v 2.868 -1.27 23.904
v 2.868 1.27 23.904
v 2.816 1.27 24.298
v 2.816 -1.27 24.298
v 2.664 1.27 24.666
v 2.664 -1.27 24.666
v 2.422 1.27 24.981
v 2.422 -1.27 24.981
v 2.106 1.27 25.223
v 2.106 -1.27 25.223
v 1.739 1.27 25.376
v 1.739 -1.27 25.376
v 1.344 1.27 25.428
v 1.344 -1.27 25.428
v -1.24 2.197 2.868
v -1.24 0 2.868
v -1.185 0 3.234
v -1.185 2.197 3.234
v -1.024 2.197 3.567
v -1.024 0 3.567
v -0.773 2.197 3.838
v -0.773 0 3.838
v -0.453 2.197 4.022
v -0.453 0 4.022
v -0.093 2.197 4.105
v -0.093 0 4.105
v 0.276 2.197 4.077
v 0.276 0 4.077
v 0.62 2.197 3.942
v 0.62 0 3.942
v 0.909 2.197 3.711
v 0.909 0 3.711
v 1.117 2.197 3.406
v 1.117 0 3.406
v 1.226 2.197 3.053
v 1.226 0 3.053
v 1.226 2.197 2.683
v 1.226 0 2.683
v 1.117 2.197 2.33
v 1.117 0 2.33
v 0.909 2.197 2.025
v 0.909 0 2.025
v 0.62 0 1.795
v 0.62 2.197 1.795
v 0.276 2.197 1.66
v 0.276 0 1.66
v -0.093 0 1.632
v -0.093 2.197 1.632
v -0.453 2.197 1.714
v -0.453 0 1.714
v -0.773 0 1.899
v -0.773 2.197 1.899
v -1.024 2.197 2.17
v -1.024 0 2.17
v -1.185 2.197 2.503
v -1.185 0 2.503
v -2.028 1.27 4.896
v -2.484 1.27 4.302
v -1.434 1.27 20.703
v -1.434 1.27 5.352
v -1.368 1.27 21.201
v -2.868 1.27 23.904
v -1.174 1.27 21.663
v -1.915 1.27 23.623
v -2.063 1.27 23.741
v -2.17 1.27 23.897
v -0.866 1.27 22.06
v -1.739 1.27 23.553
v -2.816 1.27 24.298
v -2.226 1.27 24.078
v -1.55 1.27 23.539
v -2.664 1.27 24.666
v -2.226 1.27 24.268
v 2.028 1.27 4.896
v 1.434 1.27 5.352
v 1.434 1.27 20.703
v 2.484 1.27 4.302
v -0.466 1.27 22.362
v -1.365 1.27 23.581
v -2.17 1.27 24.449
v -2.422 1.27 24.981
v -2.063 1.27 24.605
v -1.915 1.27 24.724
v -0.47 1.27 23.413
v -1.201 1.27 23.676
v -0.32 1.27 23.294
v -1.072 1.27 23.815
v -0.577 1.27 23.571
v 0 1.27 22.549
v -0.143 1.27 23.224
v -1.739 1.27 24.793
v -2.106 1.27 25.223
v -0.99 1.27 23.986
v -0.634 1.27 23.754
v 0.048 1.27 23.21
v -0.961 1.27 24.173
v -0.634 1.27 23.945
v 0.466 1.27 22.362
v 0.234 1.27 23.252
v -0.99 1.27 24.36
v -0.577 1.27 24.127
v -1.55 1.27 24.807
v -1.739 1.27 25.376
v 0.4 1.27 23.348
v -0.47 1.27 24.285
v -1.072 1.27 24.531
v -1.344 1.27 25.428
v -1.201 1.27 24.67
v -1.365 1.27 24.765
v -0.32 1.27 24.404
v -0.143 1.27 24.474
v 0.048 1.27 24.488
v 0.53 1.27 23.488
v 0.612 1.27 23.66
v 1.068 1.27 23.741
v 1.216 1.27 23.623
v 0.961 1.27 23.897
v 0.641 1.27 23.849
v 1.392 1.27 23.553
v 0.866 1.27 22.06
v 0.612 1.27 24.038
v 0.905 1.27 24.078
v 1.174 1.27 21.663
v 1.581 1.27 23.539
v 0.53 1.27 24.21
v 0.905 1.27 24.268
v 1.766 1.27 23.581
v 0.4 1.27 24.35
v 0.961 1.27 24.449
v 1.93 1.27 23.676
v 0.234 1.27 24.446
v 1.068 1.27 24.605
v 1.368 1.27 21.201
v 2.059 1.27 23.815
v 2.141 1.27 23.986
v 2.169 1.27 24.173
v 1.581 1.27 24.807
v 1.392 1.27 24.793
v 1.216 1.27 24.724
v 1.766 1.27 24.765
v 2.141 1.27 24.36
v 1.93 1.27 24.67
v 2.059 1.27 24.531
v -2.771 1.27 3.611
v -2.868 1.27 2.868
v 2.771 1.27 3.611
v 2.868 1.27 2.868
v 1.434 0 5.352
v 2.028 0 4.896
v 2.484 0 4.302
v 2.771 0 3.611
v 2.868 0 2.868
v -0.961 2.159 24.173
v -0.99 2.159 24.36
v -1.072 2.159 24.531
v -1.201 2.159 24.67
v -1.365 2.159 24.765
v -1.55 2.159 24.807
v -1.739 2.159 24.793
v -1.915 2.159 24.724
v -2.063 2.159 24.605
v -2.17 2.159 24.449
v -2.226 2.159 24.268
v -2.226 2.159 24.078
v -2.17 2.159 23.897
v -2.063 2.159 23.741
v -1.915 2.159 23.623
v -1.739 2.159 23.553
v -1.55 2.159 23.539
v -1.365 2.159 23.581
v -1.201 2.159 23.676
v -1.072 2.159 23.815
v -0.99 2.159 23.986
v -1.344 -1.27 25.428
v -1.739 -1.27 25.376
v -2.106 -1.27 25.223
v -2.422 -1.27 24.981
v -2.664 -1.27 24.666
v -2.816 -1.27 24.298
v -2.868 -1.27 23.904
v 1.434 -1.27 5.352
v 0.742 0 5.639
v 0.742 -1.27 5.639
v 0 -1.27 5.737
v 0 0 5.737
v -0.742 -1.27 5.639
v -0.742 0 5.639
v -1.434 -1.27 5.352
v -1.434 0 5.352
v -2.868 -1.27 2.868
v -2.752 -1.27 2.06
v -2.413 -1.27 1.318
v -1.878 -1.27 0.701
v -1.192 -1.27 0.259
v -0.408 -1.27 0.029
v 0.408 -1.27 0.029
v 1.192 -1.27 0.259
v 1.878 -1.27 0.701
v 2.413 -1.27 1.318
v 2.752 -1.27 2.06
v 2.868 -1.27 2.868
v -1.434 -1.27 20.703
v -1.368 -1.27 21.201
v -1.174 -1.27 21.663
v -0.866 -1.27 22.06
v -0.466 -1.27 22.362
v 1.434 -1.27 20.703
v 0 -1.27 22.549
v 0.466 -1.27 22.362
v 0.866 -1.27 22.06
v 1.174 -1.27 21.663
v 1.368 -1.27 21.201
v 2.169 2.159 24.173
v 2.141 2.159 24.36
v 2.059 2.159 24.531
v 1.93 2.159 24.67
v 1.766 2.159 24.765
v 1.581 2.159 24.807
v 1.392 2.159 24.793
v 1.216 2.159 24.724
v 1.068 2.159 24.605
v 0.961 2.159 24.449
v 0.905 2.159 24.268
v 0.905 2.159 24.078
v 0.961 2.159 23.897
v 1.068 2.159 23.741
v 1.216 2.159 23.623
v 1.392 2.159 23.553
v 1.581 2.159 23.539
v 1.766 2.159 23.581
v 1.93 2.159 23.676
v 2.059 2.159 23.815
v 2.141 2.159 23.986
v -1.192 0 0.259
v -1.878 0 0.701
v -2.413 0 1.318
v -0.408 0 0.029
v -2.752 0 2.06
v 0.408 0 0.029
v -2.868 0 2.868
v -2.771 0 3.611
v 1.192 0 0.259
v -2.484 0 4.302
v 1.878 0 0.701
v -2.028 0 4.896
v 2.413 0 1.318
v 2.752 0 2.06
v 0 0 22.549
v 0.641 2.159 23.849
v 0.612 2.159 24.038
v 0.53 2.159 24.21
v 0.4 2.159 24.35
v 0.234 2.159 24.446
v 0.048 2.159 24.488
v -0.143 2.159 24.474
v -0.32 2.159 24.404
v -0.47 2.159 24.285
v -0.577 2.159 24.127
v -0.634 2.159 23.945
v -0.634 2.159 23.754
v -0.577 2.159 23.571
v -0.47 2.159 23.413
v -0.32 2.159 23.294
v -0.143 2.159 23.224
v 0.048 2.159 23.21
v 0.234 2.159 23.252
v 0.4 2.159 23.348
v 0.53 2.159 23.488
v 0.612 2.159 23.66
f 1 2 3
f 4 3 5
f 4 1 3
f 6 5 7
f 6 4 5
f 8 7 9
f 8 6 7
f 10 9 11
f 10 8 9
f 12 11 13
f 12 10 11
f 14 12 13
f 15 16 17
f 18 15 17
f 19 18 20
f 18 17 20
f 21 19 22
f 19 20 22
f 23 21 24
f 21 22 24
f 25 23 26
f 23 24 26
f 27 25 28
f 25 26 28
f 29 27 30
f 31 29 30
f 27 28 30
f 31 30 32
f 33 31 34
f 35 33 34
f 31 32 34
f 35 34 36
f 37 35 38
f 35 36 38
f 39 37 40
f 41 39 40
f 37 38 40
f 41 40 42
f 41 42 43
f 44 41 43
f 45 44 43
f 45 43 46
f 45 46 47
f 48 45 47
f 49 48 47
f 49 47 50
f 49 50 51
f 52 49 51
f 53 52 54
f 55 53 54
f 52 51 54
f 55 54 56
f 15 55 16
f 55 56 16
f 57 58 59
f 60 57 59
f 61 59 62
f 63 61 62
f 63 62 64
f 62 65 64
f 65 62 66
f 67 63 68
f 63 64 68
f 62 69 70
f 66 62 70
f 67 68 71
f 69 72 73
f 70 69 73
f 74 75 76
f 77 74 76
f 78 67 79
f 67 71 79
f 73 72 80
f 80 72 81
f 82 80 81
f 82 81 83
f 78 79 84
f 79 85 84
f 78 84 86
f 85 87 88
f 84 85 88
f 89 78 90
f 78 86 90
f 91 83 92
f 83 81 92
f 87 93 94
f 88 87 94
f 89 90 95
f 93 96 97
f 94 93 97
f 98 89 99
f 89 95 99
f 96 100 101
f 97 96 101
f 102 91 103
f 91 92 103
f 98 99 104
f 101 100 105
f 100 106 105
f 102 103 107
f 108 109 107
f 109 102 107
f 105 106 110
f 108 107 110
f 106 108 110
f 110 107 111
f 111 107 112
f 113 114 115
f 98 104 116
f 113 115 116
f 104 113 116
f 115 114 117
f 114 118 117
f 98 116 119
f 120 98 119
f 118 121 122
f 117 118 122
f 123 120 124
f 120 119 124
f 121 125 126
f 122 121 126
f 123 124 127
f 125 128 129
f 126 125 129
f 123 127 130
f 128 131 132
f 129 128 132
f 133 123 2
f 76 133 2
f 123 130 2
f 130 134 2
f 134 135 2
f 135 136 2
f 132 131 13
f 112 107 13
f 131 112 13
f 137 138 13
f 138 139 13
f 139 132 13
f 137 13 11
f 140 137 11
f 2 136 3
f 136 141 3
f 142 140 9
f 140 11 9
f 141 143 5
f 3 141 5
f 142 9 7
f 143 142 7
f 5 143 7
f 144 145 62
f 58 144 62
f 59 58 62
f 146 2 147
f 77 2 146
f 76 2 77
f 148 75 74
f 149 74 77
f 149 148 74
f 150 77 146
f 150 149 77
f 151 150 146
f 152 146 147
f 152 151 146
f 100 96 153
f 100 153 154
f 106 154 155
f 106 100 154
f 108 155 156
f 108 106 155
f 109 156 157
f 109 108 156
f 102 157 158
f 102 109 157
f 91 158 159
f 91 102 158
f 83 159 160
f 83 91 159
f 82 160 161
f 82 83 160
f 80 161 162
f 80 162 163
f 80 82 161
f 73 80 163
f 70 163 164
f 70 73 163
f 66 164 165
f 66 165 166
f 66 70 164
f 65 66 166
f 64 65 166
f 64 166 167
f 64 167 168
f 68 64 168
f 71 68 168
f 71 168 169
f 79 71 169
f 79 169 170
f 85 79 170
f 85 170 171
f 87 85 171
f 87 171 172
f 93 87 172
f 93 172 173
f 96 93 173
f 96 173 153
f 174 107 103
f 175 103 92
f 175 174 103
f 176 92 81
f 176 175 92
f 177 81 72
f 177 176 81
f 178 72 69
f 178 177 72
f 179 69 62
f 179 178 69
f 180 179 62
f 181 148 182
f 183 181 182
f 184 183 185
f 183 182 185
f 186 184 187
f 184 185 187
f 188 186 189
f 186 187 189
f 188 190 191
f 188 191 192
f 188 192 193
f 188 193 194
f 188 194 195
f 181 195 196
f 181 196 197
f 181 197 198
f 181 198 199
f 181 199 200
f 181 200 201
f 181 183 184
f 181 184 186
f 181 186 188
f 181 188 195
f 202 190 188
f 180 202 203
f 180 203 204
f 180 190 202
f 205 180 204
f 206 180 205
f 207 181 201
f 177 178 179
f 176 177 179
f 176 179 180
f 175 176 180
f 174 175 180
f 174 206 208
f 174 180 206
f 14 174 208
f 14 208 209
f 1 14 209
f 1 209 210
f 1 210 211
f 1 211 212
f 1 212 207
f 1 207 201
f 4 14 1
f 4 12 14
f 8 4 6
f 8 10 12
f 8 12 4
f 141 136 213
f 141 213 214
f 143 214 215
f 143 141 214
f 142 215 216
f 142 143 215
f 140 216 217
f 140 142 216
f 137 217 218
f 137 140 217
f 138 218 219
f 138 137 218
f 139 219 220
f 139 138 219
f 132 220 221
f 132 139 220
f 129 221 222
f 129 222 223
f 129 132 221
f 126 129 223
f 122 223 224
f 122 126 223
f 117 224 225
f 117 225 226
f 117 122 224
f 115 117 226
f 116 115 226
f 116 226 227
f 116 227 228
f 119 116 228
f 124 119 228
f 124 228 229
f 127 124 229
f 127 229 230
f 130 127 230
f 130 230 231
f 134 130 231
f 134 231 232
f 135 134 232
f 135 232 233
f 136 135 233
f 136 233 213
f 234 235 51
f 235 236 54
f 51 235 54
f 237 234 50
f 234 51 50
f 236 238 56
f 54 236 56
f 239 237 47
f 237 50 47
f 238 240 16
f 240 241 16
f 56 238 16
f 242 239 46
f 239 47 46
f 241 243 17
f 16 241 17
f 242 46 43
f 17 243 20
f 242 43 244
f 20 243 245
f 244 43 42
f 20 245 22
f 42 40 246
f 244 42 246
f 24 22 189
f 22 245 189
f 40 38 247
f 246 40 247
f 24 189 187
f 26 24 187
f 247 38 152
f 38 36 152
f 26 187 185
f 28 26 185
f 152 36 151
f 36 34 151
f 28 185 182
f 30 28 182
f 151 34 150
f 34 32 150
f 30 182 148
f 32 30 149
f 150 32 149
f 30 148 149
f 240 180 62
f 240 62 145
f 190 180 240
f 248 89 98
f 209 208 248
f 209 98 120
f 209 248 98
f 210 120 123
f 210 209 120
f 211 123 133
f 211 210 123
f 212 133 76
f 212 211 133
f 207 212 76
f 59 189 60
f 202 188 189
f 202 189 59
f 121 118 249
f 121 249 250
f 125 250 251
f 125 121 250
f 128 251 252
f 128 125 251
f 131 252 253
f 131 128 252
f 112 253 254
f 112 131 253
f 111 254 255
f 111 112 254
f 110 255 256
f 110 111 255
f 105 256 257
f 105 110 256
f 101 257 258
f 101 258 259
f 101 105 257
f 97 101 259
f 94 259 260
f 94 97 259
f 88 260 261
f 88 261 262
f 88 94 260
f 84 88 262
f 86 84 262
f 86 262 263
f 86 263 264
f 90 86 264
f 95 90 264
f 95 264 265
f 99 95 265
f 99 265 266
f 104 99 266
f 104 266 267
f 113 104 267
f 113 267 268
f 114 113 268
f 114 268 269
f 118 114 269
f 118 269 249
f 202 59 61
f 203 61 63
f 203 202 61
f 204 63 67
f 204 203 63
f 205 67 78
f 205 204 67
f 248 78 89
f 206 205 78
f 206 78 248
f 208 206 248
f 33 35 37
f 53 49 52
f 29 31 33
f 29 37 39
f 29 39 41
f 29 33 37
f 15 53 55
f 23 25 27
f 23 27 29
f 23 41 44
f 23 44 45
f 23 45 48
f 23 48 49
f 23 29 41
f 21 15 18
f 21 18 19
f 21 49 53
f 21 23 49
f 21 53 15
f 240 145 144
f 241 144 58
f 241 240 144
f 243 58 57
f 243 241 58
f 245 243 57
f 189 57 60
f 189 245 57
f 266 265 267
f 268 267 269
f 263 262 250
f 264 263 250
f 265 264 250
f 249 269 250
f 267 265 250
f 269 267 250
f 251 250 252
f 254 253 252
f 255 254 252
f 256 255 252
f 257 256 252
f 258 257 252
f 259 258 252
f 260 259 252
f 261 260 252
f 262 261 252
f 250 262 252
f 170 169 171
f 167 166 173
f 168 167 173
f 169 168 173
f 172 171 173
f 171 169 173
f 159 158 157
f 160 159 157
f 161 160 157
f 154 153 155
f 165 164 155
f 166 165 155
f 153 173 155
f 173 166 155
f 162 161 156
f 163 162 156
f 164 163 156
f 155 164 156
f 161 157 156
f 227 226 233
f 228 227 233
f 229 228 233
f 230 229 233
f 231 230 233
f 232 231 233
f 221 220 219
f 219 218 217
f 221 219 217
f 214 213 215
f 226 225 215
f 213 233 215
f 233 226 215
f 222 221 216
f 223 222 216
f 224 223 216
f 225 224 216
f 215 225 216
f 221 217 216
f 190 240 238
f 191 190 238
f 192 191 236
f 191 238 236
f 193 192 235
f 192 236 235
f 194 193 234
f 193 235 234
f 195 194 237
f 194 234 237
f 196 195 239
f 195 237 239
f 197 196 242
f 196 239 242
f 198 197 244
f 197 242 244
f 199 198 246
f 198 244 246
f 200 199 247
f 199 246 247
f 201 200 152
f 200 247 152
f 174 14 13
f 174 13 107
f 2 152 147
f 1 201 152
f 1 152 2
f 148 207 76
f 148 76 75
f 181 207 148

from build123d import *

# Parameters (mm, degrees)
F1_DEPTH    = 1.27
F3_R        = 1.524
F5_T1_DEPTH = 1.27
F2_R        = 1.2397519619
F6_DEPTH    = 2.1971
F4_R        = 0.6356353333
F4_R_2      = 0.6409754112
F7_DEPTH    = 3.429
F9_DEPTH    = 2.54


# Not quite as in the source:
# - a fillet or chamfer that OpenCascade refuses, or shapes differently, is made with other operations: its cross-section is extruded or revolved along the edge and cut away or added


with BuildPart() as f1:
    # F0 (on Front) → F1 (new body)
    with BuildSketch(Plane.XZ):
        with BuildLine():
            ThreePointArc((1.4341250062, 5.3522273875), (2.4839773751, 4.3023750186), (2.8682500124, 2.8682500124))
            Line((2.8682500124, 2.8682500124), (2.8682500124, 25.4276227206))
            Line((2.8682500124, 25.4276227206), (0, 25.4276227206))
            Line((0, 25.4276227206), (-1.4341250062, 25.4276227206))
            Line((-1.4341250062, 25.4276227206), (-2.8682500124, 25.4276227206))
            Line((-2.8682500124, 25.4276227206), (-2.8682500124, 2.8682500124))
            ThreePointArc((-2.8682500124, 2.8682500124), (-2.4839773751, 4.3023750186), (-1.4341250062, 5.3522273875))
            Line((-1.4341250062, 5.3522273875), (-1.4341250062, 22.6080268621))
            Line((-1.4341250062, 22.6080268621), (1.4341250062, 22.6080268621))
            Line((1.4341250062, 22.6080268621), (1.4341250062, 5.3522273875))
        make_face()
        with BuildLine():
            ThreePointArc((-2.8682500124, 2.8682500124), (0, 0), (2.8682500124, 2.8682500124))
            ThreePointArc((2.8682500124, 2.8682500124), (2.4839773751, 4.3023750186), (1.4341250062, 5.3522273875))
            ThreePointArc((1.4341250062, 5.3522273875), (0, 5.7365000248), (-1.4341250062, 5.3522273875))
            ThreePointArc((-1.4341250062, 5.3522273875), (-2.4839773751, 4.3023750186), (-2.8682500124, 2.8682500124))
        make_face()
    extrude(amount=F1_DEPTH)

    # F3
    f3_edges = [f1.edges().sort_by_distance(p)[0] for p in [
        (2.86825, -0.635, 25.427623),
        (-2.86825, -0.635, 25.427623),
    ]]
    fillet(f3_edges, radius=F3_R)

    # F5: fillet of radius 1.905 on 2 edges, made by hand

    # F5_s2 → F5_t1 (join)
    with BuildSketch(Plane.XZ):
        with BuildLine():
            ThreePointArc((-0.4708749938, 22.6080268621), (0.8761634244, 22.0500652803), (1.4341250062, 20.7030268621))
            Line((1.4341250062, 20.7030268621), (1.4341250062, 22.6080268621))
            Line((1.4341250062, 22.6080268621), (-0.4708749938, 22.6080268621))
        make_face()
        with BuildLine():
            ThreePointArc((-1.4341250062, 20.7030268621), (-0.8761634244, 22.0500652803), (0.4708749938, 22.6080268621))
            Line((0.4708749938, 22.6080268621), (-1.4341250062, 22.6080268621))
            Line((-1.4341250062, 22.6080268621), (-1.4341250062, 20.7030268621))
        make_face()
    extrude(amount=F5_T1_DEPTH)

    # F2 (on face) → F6 (join)
    with BuildSketch(Plane(origin=(0, 0, 0), x_dir=(-1, 0, 0), z_dir=(0, 1, 0))):
        with Locations((0, 2.8682500124)):
            Circle(F2_R)
    extrude(amount=F6_DEPTH)

    # F4 (on face) → F7 (join)
    with BuildSketch(Plane.XZ.offset(1.27)):
        with Locations((-1.5970880988, 24.1730304042)):
            Circle(F4_R)
        with Locations((1.5335635452, 24.1730304042)):
            Circle(F4_R)
        with Locations((0, 23.8491314396)):
            Circle(F4_R_2)
    extrude(amount=-F7_DEPTH)

    # F8 (on face) → F9 (join)
    with BuildSketch(Plane.XZ.offset(1.27)):
        with BuildLine():
            ThreePointArc((1.4341250062, 5.3522273875), (2.4839773751, 4.3023750186), (2.8682500124, 2.8682500124))
            Line((2.8682500124, 2.8682500124), (2.8682500124, 23.9036227206))
            ThreePointArc((2.8682500124, 23.9036227206), (1.7143439066, 22.42524303), (0, 23.1855921473))
            ThreePointArc((0, 23.1855921473), (-1.7143439066, 22.42524303), (-2.8682500124, 23.9036227206))
            Line((-2.8682500124, 23.9036227206), (-2.8682500124, 22.548914654))
            Line((-2.8682500124, 22.548914654), (-2.8682500124, 2.8682500124))
            ThreePointArc((-2.8682500124, 2.8682500124), (-2.4839773751, 4.3023750186), (-1.4341250062, 5.3522273875))
            Line((-1.4341250062, 5.3522273875), (-1.4341250062, 20.7030268621))
            ThreePointArc((-1.4341250062, 20.7030268621), (-1.0334590554, 21.8717886293), (0, 22.548914654))
            ThreePointArc((0, 22.548914654), (1.0334590554, 21.8717886293), (1.4341250062, 20.7030268621))
            Line((1.4341250062, 20.7030268621), (1.4341250062, 5.3522273875))
        make_face()
        with BuildLine():
            ThreePointArc((-2.8682500124, 23.9036227206), (-1.7143439066, 22.42524303), (0, 23.1855921473))
            ThreePointArc((0, 23.1855921473), (-0.1797499876, 23.9036227206), (0, 24.6216532939))
            ThreePointArc((0, 24.6216532939), (-0.5605736103, 25.2106909273), (-1.3442500124, 25.4276227206))
            ThreePointArc((-1.3442500124, 25.4276227206), (-2.4218807469, 24.9812534551), (-2.8682500124, 23.9036227206))
        make_face()
        with BuildLine():
            ThreePointArc((0, 23.1855921473), (1.7143439066, 22.42524303), (2.8682500124, 23.9036227206))
            ThreePointArc((2.8682500124, 23.9036227206), (2.4218807469, 24.9812534551), (1.3442500124, 25.4276227206))
            ThreePointArc((1.3442500124, 25.4276227206), (0.5605736103, 25.2106909273), (0, 24.6216532939))
            ThreePointArc((0, 24.6216532939), (0.1341296782, 24.2737166148), (0.1797499876, 23.9036227206))
            ThreePointArc((0.1797499876, 23.9036227206), (0.1341296782, 23.5335288264), (0, 23.1855921473))
        make_face()
        with BuildLine():
            ThreePointArc((0, 24.6216532939), (-0.1797499876, 23.9036227206), (0, 23.1855921473))
            ThreePointArc((0, 23.1855921473), (0.1341296782, 23.5335288264), (0.1797499876, 23.9036227206))
            ThreePointArc((0.1797499876, 23.9036227206), (0.1341296782, 24.2737166148), (0, 24.6216532939))
        make_face()
        with BuildLine():
            ThreePointArc((0, 24.6216532939), (0.5605736103, 25.2106909273), (1.3442500124, 25.4276227206))
            Line((1.3442500124, 25.4276227206), (-1.3442500124, 25.4276227206))
            ThreePointArc((-1.3442500124, 25.4276227206), (-0.5605736103, 25.2106909273), (0, 24.6216532939))
        make_face()
    extrude(amount=-F9_DEPTH)


solid = f1.part
